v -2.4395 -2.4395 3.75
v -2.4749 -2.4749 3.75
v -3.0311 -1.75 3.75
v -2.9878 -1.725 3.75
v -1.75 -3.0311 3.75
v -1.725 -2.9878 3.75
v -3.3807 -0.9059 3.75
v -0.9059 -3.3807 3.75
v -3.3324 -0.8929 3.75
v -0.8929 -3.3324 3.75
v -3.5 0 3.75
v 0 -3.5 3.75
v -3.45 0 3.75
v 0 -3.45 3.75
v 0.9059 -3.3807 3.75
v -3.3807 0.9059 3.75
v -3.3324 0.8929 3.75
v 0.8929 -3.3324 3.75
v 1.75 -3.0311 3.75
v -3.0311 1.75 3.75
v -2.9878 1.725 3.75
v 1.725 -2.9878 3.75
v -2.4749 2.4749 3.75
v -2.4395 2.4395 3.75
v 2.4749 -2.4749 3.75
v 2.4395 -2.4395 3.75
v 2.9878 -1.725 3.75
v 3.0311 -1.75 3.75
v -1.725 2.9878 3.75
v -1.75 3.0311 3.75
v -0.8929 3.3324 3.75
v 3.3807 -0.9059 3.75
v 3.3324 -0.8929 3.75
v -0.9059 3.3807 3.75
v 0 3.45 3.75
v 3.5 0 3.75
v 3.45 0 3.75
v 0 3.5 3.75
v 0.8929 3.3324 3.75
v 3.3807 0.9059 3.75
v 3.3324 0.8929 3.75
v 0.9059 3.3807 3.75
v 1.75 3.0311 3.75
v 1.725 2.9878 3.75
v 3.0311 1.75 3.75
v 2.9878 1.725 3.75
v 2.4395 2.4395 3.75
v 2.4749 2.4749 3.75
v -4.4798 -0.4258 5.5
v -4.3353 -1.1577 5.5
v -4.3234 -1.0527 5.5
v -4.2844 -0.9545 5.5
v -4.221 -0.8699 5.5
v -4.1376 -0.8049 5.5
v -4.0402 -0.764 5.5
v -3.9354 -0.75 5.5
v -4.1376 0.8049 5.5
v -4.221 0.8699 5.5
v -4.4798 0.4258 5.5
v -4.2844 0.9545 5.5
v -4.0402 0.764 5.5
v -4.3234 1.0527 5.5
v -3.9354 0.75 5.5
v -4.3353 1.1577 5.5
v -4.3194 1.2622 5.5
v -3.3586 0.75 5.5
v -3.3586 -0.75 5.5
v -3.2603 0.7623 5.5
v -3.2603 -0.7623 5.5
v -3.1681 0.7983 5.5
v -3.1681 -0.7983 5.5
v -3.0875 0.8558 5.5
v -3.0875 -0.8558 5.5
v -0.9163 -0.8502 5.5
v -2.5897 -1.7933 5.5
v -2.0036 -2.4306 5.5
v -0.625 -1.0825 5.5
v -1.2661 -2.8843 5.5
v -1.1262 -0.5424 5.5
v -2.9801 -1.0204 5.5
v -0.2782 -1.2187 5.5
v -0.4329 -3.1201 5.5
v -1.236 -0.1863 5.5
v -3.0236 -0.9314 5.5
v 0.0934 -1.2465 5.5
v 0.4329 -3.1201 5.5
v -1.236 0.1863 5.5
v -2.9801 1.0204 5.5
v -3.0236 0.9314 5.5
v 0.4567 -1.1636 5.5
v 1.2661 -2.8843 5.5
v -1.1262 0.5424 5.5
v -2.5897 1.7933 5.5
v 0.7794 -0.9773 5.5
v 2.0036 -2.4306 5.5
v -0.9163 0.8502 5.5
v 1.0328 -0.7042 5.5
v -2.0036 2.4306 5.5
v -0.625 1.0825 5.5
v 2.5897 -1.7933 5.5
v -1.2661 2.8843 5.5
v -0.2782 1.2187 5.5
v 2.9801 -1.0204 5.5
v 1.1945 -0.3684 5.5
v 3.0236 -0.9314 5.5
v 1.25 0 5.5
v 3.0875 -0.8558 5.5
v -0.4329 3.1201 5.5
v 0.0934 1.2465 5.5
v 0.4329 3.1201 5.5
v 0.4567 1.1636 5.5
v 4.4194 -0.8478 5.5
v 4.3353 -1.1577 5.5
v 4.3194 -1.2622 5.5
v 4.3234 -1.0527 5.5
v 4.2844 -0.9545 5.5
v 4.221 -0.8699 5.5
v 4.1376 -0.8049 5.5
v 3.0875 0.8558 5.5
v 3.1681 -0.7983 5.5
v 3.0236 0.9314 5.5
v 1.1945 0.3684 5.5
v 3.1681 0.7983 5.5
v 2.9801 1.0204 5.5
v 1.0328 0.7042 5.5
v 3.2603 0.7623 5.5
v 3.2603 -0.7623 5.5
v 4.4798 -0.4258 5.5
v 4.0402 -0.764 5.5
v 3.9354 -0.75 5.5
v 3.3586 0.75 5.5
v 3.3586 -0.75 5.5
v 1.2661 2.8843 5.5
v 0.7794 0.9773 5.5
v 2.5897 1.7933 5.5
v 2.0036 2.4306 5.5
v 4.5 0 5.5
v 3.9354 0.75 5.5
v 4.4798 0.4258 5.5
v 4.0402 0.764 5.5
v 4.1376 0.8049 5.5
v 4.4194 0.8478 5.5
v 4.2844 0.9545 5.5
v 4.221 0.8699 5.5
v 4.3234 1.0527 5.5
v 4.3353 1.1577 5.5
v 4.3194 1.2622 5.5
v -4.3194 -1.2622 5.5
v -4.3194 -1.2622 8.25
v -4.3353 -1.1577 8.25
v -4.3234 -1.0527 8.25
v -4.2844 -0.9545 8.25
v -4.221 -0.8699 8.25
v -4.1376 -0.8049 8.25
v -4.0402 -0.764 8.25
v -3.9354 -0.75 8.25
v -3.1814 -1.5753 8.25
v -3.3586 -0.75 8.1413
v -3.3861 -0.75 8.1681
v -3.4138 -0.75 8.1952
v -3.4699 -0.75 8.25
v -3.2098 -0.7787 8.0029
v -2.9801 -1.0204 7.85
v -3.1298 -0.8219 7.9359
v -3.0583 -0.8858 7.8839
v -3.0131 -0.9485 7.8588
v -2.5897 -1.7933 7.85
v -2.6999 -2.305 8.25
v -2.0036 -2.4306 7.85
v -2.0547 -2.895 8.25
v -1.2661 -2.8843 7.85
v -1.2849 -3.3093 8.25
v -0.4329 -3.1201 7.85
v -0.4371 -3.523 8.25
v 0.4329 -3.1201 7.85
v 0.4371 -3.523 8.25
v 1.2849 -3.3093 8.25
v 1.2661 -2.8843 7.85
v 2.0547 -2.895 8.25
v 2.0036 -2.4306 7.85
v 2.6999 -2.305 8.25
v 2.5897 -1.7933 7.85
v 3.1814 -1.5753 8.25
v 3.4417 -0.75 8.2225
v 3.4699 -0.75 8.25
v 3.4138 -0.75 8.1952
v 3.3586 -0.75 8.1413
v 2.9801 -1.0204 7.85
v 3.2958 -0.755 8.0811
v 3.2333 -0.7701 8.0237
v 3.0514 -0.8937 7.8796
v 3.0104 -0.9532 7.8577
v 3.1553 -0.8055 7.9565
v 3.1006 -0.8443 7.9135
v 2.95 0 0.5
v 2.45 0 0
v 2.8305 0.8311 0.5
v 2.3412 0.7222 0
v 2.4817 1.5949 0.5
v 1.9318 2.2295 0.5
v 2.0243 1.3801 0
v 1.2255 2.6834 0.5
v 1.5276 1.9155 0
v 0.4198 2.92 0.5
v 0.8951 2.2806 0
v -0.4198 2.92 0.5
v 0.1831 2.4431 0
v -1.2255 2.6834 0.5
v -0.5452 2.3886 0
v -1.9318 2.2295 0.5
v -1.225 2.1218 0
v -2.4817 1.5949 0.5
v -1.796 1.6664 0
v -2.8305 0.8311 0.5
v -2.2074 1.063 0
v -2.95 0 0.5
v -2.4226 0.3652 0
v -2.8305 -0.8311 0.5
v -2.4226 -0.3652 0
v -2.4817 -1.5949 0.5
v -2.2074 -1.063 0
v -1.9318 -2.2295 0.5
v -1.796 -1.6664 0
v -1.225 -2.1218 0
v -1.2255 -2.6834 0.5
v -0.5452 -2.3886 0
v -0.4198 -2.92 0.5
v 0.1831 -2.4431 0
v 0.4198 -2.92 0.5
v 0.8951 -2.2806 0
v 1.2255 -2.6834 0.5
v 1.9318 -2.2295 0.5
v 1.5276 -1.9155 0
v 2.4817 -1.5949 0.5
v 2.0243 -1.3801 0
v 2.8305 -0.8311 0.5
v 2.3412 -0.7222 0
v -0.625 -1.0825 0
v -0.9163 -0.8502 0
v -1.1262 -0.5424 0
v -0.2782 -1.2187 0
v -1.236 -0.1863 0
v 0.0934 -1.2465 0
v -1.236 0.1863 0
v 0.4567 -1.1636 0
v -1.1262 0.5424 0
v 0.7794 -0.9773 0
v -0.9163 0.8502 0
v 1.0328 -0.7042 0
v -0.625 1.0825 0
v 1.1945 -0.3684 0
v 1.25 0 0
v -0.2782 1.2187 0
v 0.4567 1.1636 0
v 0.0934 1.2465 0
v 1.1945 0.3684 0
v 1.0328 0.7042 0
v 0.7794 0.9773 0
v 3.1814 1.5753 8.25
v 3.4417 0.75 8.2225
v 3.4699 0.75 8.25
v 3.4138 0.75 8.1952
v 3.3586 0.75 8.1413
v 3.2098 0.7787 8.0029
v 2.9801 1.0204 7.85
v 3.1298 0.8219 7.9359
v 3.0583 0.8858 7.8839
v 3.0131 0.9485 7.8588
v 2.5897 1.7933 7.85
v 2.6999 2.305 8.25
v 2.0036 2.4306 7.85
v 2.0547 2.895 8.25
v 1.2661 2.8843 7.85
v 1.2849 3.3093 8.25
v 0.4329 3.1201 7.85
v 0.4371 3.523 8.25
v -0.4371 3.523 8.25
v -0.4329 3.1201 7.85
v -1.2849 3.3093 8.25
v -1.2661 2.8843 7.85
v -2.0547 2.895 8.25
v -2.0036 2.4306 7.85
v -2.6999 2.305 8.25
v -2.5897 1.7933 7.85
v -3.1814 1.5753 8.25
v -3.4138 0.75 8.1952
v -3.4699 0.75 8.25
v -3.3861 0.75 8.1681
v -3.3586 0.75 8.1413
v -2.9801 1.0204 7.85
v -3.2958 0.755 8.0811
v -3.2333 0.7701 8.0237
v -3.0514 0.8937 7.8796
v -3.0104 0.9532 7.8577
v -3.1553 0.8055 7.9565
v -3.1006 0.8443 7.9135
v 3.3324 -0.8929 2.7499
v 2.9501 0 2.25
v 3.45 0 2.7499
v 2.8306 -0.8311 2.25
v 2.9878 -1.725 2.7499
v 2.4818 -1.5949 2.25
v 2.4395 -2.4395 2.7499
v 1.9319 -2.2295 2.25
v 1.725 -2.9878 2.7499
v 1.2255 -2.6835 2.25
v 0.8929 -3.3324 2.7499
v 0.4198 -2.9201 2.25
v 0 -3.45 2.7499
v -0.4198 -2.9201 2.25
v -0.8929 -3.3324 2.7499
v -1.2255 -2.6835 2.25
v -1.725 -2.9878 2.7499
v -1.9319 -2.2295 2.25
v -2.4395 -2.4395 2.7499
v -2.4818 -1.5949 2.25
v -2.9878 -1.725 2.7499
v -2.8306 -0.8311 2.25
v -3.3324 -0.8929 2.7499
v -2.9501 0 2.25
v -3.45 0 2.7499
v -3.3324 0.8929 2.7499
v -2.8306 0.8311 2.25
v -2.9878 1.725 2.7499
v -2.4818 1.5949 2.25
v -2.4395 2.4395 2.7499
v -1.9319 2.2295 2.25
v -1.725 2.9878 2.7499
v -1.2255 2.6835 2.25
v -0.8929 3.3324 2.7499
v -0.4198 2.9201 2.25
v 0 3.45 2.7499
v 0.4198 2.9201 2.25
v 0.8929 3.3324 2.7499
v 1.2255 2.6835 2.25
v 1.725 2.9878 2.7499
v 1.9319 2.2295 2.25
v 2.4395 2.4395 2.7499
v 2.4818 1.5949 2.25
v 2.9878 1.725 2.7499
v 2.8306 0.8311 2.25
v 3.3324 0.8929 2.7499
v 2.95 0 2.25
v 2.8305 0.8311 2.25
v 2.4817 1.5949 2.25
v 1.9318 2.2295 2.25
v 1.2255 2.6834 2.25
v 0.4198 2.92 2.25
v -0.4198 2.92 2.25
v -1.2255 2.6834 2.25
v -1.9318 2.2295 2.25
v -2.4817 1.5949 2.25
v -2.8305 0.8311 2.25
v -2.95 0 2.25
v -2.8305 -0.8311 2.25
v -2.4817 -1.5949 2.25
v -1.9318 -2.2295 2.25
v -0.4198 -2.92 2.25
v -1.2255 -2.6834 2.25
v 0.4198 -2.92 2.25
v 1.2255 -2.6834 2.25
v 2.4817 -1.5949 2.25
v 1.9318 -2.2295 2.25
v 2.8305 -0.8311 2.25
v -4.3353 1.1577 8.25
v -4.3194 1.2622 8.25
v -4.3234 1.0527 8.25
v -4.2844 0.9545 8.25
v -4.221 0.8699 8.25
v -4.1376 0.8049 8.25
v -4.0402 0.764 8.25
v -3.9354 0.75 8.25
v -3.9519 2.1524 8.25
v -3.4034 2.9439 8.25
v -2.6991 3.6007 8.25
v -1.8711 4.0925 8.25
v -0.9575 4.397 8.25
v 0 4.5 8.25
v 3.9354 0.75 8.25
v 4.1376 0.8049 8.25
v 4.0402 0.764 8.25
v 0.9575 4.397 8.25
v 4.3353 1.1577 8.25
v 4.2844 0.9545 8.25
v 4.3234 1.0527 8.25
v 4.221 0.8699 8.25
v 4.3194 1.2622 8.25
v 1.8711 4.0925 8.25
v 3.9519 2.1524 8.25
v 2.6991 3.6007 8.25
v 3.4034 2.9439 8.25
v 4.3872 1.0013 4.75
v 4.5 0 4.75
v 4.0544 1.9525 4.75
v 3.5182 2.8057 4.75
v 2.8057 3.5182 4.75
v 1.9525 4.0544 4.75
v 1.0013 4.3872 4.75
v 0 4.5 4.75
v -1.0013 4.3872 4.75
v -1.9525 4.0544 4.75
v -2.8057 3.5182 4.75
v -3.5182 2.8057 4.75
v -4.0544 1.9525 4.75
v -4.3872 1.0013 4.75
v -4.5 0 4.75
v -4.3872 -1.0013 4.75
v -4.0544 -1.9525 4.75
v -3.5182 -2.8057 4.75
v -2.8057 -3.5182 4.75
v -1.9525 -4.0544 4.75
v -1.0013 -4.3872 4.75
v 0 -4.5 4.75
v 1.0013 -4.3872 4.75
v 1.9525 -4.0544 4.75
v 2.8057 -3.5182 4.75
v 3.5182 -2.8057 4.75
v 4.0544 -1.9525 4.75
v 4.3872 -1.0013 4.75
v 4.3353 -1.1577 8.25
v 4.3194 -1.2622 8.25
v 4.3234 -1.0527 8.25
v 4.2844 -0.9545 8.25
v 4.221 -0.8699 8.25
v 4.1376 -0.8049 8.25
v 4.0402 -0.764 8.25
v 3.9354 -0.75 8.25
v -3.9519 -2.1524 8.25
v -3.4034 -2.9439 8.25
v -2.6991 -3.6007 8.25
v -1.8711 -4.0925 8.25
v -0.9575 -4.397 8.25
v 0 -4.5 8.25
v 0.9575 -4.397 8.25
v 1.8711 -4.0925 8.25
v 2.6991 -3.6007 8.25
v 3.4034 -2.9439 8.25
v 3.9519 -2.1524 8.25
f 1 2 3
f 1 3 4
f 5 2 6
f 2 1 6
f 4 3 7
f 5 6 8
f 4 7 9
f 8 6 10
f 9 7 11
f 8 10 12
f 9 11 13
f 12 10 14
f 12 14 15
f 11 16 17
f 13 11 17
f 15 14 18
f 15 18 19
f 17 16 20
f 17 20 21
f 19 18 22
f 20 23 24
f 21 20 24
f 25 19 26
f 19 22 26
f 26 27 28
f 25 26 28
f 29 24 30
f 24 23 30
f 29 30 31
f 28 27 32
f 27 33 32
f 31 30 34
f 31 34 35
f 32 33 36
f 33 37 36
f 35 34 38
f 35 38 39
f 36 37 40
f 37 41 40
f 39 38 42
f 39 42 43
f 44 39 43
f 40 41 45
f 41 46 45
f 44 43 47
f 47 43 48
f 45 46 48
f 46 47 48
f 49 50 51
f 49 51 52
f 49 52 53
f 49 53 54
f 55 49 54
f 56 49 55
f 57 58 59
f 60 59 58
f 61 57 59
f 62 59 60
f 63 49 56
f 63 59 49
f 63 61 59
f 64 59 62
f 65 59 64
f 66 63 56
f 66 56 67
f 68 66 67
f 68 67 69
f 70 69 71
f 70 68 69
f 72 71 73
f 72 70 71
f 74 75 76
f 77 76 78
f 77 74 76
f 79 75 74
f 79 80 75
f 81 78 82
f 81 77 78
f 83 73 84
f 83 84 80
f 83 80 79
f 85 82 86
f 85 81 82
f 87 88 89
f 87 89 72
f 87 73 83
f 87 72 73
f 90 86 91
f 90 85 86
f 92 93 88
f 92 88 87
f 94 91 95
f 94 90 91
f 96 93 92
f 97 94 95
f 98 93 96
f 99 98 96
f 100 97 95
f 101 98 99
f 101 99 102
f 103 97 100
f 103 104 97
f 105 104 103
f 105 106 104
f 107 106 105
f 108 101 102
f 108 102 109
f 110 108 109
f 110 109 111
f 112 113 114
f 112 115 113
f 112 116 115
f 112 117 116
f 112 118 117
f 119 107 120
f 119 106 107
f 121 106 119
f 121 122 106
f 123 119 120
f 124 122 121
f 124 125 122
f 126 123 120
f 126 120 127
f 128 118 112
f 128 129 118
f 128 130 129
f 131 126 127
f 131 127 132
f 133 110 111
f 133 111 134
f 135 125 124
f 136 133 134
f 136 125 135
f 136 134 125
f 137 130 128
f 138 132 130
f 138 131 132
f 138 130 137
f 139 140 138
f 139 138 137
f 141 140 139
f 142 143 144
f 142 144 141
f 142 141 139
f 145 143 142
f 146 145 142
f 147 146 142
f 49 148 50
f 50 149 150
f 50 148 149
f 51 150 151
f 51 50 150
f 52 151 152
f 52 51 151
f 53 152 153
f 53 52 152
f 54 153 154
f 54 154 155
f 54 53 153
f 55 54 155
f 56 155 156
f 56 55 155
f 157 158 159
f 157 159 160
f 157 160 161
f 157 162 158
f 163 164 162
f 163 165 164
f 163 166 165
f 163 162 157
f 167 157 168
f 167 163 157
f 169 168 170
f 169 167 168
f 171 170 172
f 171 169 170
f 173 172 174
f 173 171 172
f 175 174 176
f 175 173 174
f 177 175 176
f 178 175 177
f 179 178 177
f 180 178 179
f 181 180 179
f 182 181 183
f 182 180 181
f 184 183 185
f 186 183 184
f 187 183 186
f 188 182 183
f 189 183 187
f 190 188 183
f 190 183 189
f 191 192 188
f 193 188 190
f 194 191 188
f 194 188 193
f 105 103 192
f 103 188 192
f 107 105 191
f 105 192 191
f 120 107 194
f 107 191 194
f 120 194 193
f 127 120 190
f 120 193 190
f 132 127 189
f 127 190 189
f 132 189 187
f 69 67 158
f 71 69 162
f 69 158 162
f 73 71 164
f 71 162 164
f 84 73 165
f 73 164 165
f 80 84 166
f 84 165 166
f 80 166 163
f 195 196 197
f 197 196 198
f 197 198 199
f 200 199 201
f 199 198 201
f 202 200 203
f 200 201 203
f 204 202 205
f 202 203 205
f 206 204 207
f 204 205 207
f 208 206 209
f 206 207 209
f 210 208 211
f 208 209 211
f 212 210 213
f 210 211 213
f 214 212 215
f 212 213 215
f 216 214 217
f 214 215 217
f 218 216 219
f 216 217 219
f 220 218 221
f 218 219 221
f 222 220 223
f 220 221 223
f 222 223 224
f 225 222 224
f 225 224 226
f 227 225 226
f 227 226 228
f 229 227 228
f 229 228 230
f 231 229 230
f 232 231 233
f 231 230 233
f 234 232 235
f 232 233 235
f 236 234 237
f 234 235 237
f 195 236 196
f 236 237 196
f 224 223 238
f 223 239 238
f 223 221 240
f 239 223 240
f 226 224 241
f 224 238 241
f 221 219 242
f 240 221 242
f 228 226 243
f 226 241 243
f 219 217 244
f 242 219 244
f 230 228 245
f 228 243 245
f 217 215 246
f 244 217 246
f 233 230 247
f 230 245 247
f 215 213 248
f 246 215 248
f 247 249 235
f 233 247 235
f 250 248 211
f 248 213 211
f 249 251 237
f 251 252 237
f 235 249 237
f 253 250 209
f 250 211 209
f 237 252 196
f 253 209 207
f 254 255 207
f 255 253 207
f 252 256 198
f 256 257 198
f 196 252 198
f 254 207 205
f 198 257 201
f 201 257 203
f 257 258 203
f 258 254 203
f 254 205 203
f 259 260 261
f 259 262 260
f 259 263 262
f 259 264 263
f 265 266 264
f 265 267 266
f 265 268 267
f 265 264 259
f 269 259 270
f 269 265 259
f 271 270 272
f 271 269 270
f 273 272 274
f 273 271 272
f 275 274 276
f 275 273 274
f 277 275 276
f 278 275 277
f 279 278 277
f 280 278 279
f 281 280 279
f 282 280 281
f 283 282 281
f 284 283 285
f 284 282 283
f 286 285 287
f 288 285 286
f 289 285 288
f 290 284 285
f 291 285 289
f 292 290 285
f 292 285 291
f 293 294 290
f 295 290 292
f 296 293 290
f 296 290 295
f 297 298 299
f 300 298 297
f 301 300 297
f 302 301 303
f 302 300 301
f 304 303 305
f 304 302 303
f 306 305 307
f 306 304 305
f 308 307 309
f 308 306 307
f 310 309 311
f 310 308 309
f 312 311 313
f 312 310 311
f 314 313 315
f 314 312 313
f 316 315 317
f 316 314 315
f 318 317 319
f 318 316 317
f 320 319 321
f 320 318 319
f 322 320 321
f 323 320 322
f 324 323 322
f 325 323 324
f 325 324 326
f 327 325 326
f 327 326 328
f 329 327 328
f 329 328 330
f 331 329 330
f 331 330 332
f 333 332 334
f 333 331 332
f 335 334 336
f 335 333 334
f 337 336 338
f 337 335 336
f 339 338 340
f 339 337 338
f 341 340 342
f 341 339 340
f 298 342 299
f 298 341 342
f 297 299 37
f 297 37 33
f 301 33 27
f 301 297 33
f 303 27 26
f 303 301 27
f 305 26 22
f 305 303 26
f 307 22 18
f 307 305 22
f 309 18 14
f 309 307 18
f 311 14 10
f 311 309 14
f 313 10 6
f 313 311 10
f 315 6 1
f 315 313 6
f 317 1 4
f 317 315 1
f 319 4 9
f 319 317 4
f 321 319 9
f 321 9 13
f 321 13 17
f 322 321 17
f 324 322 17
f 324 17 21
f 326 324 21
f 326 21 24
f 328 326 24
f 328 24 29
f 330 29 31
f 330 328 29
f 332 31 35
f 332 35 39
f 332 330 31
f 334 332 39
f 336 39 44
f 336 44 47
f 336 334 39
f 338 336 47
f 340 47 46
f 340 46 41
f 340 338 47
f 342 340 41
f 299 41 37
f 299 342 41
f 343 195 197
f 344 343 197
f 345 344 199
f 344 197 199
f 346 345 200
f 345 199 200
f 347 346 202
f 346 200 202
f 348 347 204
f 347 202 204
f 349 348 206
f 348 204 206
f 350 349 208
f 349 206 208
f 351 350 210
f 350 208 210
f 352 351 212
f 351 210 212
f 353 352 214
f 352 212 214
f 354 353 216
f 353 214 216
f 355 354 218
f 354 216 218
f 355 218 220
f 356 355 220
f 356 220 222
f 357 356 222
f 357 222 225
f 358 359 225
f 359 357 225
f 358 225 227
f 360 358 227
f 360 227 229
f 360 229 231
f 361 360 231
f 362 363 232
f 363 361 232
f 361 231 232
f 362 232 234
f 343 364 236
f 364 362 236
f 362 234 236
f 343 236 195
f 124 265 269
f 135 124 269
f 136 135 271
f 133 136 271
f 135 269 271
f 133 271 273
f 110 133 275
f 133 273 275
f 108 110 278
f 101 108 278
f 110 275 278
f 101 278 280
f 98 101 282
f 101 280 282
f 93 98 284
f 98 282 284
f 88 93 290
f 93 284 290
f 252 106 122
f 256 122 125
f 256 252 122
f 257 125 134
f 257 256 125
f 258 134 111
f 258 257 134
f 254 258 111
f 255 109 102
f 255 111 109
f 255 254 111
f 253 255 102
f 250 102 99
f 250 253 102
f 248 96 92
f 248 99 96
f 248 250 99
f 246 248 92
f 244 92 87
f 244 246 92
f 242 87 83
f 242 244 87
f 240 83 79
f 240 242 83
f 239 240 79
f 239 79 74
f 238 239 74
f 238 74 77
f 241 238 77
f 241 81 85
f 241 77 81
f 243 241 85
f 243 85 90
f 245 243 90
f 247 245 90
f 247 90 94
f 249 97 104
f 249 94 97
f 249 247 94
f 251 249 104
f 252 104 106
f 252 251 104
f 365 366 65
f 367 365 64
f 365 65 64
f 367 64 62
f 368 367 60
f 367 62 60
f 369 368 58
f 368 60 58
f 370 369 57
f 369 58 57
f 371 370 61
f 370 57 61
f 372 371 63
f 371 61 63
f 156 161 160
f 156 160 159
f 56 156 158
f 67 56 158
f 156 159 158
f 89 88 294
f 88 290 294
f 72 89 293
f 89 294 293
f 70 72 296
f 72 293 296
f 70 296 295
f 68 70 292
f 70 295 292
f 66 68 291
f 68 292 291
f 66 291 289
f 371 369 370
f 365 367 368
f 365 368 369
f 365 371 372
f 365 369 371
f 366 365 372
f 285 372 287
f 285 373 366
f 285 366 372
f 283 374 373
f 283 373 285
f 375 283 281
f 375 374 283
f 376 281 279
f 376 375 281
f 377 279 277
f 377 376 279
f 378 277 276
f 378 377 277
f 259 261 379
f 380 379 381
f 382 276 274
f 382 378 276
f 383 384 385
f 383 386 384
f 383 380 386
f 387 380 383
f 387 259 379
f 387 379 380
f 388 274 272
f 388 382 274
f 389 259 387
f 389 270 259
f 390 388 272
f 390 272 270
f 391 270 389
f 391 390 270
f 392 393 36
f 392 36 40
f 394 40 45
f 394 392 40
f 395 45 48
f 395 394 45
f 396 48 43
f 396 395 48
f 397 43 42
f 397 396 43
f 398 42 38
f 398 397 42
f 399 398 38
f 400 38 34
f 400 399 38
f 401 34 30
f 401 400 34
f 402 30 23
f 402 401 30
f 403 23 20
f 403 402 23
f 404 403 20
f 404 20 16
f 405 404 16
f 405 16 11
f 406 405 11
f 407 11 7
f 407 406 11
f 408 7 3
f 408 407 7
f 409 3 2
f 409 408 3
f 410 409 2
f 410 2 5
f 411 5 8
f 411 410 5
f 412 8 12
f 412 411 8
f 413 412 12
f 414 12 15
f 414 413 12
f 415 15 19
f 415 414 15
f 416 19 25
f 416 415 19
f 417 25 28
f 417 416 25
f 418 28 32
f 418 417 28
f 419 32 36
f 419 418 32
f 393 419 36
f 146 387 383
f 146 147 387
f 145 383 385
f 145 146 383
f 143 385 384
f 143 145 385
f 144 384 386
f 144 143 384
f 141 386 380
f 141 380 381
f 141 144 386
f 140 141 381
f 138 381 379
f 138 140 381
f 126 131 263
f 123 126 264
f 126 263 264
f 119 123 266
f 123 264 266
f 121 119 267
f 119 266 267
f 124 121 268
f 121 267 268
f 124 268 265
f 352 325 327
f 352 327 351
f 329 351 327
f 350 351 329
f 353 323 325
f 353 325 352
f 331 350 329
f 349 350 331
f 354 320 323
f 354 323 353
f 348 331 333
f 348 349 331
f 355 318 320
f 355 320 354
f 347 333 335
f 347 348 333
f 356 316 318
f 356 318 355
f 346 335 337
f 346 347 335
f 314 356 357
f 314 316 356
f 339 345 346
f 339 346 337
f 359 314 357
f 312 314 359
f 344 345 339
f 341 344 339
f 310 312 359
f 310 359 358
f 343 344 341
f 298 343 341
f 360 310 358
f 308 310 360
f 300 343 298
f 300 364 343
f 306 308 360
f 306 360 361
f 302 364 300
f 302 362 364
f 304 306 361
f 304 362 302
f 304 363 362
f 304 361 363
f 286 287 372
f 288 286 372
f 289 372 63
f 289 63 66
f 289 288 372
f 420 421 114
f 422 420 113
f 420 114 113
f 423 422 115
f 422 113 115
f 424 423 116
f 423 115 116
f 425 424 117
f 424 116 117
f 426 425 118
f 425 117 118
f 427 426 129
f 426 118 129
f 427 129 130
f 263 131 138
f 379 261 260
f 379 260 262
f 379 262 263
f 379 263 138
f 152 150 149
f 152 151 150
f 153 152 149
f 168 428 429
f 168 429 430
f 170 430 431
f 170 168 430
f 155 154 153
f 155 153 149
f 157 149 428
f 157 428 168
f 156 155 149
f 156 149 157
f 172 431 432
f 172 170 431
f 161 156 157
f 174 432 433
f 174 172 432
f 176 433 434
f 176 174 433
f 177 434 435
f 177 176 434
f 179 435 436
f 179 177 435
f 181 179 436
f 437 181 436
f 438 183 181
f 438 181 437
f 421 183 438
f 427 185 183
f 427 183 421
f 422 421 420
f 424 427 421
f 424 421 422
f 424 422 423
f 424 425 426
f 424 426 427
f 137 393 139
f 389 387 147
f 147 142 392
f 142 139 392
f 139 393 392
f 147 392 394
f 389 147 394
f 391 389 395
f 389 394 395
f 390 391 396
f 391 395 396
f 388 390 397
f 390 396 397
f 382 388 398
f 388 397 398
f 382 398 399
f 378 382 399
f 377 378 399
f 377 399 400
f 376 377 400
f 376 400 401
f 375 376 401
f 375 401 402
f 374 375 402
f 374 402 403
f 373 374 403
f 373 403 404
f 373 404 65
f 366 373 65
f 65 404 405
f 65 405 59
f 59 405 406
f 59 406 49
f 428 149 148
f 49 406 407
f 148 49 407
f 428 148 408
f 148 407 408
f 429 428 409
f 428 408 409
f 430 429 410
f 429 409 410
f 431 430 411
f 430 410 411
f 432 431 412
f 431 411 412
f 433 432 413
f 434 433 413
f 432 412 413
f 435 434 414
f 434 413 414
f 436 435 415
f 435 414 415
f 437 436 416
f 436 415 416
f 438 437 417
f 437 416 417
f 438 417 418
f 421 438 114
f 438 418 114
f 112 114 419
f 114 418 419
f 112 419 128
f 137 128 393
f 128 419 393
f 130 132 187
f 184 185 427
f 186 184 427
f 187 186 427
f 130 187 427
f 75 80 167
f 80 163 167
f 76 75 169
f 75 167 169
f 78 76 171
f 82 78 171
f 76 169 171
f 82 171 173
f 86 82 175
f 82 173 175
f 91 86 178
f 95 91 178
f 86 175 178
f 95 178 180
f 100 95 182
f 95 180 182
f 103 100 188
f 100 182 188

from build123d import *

# Parameters (mm, degrees)
SKETCH1_R           = 2.95
SKETCH1_R_2         = 1.25
BOSS_EXTRUDE1_DEPTH = 3.75
SKETCH2_R           = 4.5
SKETCH2_R_2         = 1.25
BOSS_EXTRUDE2_DEPTH = 4.5
SKETCH3_R           = 3.15
CUT_EXTRUDE1_DEPTH  = 2.75
CHAMFER1_SIZE       = 0.4
CHAMFER2_SIZE       = 0.5
BOSS_EXTRUDE3_START = 1.5
SKETCH4_R           = 3.45
SKETCH4_R_2         = 1.25
BOSS_EXTRUDE3_DEPTH = 1.5
CHAMFER3_SIZE       = 1
CHAMFER6_SIZE       = 0.5
CUT_EXTRUDE2_REACH  = 12.419
SKETCH5_W           = 12.167806538
SKETCH5_H           = 1.5
FILLET1_R           = 0.4


with BuildPart() as part:
    # Sketch1 → Boss-Extrude1 (new body)
    with BuildSketch(Plane.XY):
        Circle(SKETCH1_R)
        Circle(SKETCH1_R_2, mode=Mode.SUBTRACT)
    extrude(amount=BOSS_EXTRUDE1_DEPTH)

    # Sketch2 → Boss-Extrude2 (add)
    with BuildSketch(Plane.XY.offset(3.75)):
        Circle(SKETCH2_R)
        Circle(SKETCH2_R_2, mode=Mode.SUBTRACT)
    extrude(amount=BOSS_EXTRUDE2_DEPTH)

    # Sketch3 → Cut-Extrude1 (cut)
    with BuildSketch(Plane.XY.offset(8.25)):
        Circle(SKETCH3_R)
    extrude(amount=-CUT_EXTRUDE1_DEPTH, mode=Mode.SUBTRACT)

    # Chamfer1
    chamfer1_edges = [part.edges().sort_by_distance(p)[0] for p in [
        (-3.15, 0, 8.25),
    ]]
    chamfer(chamfer1_edges, length=CHAMFER1_SIZE)

    # Chamfer2
    chamfer2_edges = [part.edges().sort_by_distance(p)[0] for p in [
        (-2.95, 0, 0),
    ]]
    chamfer(chamfer2_edges, length=CHAMFER2_SIZE)

    # Sketch4 → Boss-Extrude3 (add)
    with BuildSketch(Plane(origin=(0, 0, 3.75), x_dir=(-1, 0, 0), z_dir=(0, 0, -1)).offset(BOSS_EXTRUDE3_START)):
        with Locations(Location((0, 0, 0), (0, 0, 180))):
            Circle(SKETCH4_R)
        with Locations(Location((0, 0, 0), (0, 0, 180))):
            Circle(SKETCH4_R_2, mode=Mode.SUBTRACT)
    extrude(amount=-BOSS_EXTRUDE3_DEPTH)

    # Chamfer3
    chamfer3_edges = [part.edges().sort_by_distance(p)[0] for p in [
        (-4.5, 0, 3.75),
    ]]
    chamfer(chamfer3_edges, length=CHAMFER3_SIZE)

    # Chamfer6
    chamfer6_edges = [part.edges().sort_by_distance(p)[0] for p in [
        (-3.45, 0, 2.25),
    ]]
    chamfer(chamfer6_edges, length=CHAMFER6_SIZE - 0.0001)  # a hair under: the kernel refuses the full size

    # Cut-Extrude2: up to this face of the body (flat: up to its plane)
    cut_extrude2_end = Plane(part.part.faces().sort_by_distance((-3.060904546, 0, 5.5))[0])
    # Sketch5 → Cut-Extrude2 (cut, up to the picked face)
    with BuildSketch(Plane.XY.offset(8.25), mode=Mode.PRIVATE) as cut_extrude2_sk1:
        Rectangle(SKETCH5_W, SKETCH5_H)
    cut_extrude2_tool1 = split(extrude(cut_extrude2_sk1.sketch, amount=-CUT_EXTRUDE2_REACH, mode=Mode.PRIVATE), bisect_by=cut_extrude2_end, keep=Keep.BOTH, mode=Mode.PRIVATE)
    add(cut_extrude2_tool1.solids().sort_by(Axis((0, 0, 8.25), (0, 0, -1)))[0], mode=Mode.SUBTRACT)

    # Fillet1
    fillet1_edges = [part.edges().sort_by_distance(p)[0] for p in [
        (3.059411708, -0.75, 6.675),
        (-3.059411708, -0.75, 6.675),
        (4.437059837, -0.75, 6.875),
        (-4.437059837, -0.75, 6.875),
        (-3.059411708, 0.75, 6.675),
        (3.059411708, 0.75, 6.675),
        (-4.437059837, 0.75, 6.875),
        (4.437059837, 0.75, 6.875),
    ]]
    fillet(fillet1_edges, radius=FILLET1_R)


solid = part.part
